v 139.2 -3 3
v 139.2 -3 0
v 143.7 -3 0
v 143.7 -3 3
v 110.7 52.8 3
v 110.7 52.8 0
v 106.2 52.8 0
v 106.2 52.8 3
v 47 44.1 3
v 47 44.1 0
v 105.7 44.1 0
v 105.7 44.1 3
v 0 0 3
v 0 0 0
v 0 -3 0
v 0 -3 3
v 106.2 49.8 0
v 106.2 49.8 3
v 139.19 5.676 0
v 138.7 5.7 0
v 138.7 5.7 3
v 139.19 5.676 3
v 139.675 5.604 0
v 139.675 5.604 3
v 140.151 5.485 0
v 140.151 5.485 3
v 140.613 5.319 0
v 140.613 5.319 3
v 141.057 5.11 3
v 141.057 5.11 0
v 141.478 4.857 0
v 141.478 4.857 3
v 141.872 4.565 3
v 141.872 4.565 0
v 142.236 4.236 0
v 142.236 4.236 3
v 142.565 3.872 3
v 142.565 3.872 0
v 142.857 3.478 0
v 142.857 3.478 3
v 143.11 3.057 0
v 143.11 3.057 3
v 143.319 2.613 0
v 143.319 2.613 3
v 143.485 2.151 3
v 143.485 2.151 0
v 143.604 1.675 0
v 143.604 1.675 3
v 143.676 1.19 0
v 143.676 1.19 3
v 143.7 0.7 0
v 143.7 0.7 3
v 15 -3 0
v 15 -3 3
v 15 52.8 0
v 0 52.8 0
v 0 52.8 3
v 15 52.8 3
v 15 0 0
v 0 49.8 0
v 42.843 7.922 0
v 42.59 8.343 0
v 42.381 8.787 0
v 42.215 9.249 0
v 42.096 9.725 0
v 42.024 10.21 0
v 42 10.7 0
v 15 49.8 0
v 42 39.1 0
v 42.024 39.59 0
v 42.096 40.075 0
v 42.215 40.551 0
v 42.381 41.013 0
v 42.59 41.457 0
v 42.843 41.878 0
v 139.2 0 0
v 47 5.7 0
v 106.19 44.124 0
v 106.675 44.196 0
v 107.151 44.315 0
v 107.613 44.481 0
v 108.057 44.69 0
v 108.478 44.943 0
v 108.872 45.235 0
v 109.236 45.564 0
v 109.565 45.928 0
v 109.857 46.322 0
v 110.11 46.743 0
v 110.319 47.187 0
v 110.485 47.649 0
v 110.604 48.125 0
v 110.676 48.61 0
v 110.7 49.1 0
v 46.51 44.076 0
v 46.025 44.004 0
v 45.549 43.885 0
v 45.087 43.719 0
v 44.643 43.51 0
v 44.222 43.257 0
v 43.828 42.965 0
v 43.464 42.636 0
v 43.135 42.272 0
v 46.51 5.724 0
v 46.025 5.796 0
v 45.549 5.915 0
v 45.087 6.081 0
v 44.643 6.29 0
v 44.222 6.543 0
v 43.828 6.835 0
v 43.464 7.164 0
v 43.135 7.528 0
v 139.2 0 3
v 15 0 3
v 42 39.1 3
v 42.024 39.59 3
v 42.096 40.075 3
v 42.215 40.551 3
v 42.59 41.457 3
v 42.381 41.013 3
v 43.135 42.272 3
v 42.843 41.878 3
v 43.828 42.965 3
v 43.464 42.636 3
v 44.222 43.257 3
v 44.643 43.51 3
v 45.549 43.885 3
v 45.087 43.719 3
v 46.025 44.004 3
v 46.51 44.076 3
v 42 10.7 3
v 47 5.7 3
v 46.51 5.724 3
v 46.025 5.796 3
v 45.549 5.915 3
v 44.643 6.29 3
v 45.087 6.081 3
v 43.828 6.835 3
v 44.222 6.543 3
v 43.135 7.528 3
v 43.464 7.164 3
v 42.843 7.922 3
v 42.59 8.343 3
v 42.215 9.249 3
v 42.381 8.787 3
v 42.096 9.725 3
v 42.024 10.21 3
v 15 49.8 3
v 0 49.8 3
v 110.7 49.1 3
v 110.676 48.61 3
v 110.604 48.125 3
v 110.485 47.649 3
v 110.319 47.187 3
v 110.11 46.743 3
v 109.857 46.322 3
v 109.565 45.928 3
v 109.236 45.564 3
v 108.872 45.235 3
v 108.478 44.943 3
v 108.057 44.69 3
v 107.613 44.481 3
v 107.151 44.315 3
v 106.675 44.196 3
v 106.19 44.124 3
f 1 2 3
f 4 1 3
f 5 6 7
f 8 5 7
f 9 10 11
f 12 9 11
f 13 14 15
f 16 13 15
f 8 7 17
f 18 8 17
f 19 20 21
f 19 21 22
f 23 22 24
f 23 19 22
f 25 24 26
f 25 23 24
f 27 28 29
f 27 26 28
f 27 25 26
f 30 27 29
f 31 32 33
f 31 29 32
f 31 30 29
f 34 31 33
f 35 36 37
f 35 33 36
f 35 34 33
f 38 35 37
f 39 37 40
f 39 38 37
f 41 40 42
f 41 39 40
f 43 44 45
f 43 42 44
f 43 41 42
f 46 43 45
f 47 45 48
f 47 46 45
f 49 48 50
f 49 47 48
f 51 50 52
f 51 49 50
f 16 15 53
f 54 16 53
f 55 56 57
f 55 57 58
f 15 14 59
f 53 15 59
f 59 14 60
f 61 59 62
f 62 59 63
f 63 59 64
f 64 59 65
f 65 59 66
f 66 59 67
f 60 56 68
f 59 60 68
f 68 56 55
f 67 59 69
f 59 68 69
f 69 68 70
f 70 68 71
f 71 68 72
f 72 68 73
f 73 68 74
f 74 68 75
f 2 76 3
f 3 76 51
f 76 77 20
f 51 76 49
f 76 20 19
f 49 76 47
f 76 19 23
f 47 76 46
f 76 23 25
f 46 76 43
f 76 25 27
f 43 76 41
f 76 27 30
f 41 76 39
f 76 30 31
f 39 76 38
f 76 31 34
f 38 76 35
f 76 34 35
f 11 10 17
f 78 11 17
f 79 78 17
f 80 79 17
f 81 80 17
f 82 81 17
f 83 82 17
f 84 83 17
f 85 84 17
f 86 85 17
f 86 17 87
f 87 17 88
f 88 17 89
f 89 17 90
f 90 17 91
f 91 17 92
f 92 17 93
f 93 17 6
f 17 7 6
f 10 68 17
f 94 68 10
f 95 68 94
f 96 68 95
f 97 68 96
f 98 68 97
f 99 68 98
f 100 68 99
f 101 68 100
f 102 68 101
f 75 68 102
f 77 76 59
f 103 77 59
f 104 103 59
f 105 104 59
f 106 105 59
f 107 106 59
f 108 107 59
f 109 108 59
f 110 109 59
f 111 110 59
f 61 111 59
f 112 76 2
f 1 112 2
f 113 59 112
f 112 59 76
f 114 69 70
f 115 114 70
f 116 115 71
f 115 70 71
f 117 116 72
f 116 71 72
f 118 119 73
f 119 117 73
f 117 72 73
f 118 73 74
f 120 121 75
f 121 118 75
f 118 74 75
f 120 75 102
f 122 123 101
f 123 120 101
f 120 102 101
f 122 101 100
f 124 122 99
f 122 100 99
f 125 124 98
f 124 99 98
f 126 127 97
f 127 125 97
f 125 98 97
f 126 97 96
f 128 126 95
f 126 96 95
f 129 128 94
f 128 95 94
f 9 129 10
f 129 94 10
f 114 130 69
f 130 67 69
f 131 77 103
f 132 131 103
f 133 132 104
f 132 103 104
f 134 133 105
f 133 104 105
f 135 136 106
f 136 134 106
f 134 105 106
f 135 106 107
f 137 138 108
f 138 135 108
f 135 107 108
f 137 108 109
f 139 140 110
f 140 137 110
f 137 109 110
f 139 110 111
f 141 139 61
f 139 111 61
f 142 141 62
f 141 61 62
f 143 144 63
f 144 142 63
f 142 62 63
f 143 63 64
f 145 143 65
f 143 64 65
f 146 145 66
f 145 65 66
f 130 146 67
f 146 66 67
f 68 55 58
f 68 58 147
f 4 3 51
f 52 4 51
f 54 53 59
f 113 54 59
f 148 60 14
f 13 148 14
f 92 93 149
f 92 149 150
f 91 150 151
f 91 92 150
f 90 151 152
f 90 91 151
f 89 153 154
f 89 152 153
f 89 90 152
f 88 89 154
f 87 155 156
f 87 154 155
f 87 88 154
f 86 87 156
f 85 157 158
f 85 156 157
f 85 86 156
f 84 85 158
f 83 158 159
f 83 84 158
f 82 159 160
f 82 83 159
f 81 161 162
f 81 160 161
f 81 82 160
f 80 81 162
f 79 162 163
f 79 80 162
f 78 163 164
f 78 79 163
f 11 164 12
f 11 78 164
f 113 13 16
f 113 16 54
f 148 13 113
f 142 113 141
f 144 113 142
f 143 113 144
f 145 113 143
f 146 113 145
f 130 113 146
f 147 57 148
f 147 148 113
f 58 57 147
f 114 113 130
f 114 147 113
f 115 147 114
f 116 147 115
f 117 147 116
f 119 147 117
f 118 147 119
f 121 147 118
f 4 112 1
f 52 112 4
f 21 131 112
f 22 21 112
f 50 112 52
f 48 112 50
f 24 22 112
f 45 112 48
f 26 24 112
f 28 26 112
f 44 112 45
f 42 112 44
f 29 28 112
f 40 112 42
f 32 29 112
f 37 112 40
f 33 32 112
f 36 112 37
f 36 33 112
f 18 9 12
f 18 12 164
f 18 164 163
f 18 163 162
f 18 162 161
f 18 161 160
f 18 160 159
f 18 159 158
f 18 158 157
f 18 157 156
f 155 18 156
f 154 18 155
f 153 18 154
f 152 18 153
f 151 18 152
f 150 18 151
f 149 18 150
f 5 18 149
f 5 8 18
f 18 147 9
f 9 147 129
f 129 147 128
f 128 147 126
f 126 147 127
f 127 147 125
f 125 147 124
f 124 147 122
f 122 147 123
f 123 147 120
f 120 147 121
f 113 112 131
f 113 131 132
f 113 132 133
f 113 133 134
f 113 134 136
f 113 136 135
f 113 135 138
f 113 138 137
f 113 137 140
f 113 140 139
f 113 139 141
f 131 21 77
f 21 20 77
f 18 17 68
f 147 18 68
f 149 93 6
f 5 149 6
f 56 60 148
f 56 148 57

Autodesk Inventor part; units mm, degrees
ref_plane "YZ Plane" through (0, 0, 0) normal (1, 0, 0) x (0, 1, 0)
ref_plane "XZ Plane" through (0, 0, 0) normal (0, 1, 0) x (-1, 0, 0)
ref_plane "XY Plane" through (0, 0, 0) normal (0, 0, 1) x (1, 0, 0)
sketch "Эскиз3" plane through (0, 0, 0) normal (0, 0, 1) x (1, 0, 0)
  line L0 (106.2, 49.8) -> (15, 49.8)
  line L1 (0, 49.8) -> (0, 0)
  line L2 (0, 0) -> (0, -3)
  line L3 (0, -3) -> (15, -3)
  line L4 (15, -3) -> (15, 0)
  line L5 (0, 49.8) -> (0, 52.8)
  line L6 (0, 52.8) -> (15, 52.8)
  line L7 (15, 52.8) -> (15, 49.8)
  line L8 (138.7, 5.7) -> (47, 5.7)
  line L9 (42, 10.7) -> (42, 39.1)
  line L10 (47, 44.1) -> (105.7, 44.1)
  line L11 (110.7, 49.1) -> (110.7, 52.8)
  line L12 (110.7, 52.8) -> (106.2, 52.8)
  line L13 (106.2, 52.8) -> (106.2, 49.8)
  arc A0 (105.7, 44.1) -> (110.7, 49.1) centre (105.7, 49.1) ccw
  arc A1 (42, 10.7) -> (47, 5.7) centre (47, 10.7) ccw
  arc A2 (47, 44.1) -> (42, 39.1) centre (47, 39.1) ccw
  line L14 (15, 0) -> (139.2, 0)
  line L15 (139.2, 0) -> (139.2, -3)
  line L16 (139.2, -3) -> (143.7, -3)
  line L17 (143.7, -3) -> (143.7, 0.7)
  arc A3 (143.7, 0.7) -> (138.7, 5.7) centre (138.7, 0.7) ccw
  point P0 (42, 5.7)
  point P1 (42, 44.1)
  point P2 (110.7, 44.1)
  point P3 (143.7, 5.7)
  dimension "d10" = 15
  dimension "d12" = 42
  dimension "d13" = 4.5
  dimension "d14" = 5
  dimension "d15" = 5.7
  dimension "d16" = 5
  dimension "d17" = 91.2
  dimension "d18" = 3
  dimension "d20" = 5
  dimension "d21" = 124.2
  dimension "d22" = 49.8
extrude "Выдавливание3" add sketch "Эскиз3" along normal blind 3
equation "\"d6\" = thickness_steel"
equation "\"tolerance_plazma\" = 0.1"
equation "\"thickness_steel\" = 3"
equation "\"d_main_screw_holes\" = 6.1"
equation "\"thickness_profile_tibea\" = 3"
equation "\"hight_shaft_shift\" = 37"
equation "\"thickness_profile_femur\" = 3"
equation "\"width_shaft_shift\" = 35"
equation "\"width_flattened_surface\" = 12"
properties part number "femur_reinforcement_tibea_steel" material "Сталь"
